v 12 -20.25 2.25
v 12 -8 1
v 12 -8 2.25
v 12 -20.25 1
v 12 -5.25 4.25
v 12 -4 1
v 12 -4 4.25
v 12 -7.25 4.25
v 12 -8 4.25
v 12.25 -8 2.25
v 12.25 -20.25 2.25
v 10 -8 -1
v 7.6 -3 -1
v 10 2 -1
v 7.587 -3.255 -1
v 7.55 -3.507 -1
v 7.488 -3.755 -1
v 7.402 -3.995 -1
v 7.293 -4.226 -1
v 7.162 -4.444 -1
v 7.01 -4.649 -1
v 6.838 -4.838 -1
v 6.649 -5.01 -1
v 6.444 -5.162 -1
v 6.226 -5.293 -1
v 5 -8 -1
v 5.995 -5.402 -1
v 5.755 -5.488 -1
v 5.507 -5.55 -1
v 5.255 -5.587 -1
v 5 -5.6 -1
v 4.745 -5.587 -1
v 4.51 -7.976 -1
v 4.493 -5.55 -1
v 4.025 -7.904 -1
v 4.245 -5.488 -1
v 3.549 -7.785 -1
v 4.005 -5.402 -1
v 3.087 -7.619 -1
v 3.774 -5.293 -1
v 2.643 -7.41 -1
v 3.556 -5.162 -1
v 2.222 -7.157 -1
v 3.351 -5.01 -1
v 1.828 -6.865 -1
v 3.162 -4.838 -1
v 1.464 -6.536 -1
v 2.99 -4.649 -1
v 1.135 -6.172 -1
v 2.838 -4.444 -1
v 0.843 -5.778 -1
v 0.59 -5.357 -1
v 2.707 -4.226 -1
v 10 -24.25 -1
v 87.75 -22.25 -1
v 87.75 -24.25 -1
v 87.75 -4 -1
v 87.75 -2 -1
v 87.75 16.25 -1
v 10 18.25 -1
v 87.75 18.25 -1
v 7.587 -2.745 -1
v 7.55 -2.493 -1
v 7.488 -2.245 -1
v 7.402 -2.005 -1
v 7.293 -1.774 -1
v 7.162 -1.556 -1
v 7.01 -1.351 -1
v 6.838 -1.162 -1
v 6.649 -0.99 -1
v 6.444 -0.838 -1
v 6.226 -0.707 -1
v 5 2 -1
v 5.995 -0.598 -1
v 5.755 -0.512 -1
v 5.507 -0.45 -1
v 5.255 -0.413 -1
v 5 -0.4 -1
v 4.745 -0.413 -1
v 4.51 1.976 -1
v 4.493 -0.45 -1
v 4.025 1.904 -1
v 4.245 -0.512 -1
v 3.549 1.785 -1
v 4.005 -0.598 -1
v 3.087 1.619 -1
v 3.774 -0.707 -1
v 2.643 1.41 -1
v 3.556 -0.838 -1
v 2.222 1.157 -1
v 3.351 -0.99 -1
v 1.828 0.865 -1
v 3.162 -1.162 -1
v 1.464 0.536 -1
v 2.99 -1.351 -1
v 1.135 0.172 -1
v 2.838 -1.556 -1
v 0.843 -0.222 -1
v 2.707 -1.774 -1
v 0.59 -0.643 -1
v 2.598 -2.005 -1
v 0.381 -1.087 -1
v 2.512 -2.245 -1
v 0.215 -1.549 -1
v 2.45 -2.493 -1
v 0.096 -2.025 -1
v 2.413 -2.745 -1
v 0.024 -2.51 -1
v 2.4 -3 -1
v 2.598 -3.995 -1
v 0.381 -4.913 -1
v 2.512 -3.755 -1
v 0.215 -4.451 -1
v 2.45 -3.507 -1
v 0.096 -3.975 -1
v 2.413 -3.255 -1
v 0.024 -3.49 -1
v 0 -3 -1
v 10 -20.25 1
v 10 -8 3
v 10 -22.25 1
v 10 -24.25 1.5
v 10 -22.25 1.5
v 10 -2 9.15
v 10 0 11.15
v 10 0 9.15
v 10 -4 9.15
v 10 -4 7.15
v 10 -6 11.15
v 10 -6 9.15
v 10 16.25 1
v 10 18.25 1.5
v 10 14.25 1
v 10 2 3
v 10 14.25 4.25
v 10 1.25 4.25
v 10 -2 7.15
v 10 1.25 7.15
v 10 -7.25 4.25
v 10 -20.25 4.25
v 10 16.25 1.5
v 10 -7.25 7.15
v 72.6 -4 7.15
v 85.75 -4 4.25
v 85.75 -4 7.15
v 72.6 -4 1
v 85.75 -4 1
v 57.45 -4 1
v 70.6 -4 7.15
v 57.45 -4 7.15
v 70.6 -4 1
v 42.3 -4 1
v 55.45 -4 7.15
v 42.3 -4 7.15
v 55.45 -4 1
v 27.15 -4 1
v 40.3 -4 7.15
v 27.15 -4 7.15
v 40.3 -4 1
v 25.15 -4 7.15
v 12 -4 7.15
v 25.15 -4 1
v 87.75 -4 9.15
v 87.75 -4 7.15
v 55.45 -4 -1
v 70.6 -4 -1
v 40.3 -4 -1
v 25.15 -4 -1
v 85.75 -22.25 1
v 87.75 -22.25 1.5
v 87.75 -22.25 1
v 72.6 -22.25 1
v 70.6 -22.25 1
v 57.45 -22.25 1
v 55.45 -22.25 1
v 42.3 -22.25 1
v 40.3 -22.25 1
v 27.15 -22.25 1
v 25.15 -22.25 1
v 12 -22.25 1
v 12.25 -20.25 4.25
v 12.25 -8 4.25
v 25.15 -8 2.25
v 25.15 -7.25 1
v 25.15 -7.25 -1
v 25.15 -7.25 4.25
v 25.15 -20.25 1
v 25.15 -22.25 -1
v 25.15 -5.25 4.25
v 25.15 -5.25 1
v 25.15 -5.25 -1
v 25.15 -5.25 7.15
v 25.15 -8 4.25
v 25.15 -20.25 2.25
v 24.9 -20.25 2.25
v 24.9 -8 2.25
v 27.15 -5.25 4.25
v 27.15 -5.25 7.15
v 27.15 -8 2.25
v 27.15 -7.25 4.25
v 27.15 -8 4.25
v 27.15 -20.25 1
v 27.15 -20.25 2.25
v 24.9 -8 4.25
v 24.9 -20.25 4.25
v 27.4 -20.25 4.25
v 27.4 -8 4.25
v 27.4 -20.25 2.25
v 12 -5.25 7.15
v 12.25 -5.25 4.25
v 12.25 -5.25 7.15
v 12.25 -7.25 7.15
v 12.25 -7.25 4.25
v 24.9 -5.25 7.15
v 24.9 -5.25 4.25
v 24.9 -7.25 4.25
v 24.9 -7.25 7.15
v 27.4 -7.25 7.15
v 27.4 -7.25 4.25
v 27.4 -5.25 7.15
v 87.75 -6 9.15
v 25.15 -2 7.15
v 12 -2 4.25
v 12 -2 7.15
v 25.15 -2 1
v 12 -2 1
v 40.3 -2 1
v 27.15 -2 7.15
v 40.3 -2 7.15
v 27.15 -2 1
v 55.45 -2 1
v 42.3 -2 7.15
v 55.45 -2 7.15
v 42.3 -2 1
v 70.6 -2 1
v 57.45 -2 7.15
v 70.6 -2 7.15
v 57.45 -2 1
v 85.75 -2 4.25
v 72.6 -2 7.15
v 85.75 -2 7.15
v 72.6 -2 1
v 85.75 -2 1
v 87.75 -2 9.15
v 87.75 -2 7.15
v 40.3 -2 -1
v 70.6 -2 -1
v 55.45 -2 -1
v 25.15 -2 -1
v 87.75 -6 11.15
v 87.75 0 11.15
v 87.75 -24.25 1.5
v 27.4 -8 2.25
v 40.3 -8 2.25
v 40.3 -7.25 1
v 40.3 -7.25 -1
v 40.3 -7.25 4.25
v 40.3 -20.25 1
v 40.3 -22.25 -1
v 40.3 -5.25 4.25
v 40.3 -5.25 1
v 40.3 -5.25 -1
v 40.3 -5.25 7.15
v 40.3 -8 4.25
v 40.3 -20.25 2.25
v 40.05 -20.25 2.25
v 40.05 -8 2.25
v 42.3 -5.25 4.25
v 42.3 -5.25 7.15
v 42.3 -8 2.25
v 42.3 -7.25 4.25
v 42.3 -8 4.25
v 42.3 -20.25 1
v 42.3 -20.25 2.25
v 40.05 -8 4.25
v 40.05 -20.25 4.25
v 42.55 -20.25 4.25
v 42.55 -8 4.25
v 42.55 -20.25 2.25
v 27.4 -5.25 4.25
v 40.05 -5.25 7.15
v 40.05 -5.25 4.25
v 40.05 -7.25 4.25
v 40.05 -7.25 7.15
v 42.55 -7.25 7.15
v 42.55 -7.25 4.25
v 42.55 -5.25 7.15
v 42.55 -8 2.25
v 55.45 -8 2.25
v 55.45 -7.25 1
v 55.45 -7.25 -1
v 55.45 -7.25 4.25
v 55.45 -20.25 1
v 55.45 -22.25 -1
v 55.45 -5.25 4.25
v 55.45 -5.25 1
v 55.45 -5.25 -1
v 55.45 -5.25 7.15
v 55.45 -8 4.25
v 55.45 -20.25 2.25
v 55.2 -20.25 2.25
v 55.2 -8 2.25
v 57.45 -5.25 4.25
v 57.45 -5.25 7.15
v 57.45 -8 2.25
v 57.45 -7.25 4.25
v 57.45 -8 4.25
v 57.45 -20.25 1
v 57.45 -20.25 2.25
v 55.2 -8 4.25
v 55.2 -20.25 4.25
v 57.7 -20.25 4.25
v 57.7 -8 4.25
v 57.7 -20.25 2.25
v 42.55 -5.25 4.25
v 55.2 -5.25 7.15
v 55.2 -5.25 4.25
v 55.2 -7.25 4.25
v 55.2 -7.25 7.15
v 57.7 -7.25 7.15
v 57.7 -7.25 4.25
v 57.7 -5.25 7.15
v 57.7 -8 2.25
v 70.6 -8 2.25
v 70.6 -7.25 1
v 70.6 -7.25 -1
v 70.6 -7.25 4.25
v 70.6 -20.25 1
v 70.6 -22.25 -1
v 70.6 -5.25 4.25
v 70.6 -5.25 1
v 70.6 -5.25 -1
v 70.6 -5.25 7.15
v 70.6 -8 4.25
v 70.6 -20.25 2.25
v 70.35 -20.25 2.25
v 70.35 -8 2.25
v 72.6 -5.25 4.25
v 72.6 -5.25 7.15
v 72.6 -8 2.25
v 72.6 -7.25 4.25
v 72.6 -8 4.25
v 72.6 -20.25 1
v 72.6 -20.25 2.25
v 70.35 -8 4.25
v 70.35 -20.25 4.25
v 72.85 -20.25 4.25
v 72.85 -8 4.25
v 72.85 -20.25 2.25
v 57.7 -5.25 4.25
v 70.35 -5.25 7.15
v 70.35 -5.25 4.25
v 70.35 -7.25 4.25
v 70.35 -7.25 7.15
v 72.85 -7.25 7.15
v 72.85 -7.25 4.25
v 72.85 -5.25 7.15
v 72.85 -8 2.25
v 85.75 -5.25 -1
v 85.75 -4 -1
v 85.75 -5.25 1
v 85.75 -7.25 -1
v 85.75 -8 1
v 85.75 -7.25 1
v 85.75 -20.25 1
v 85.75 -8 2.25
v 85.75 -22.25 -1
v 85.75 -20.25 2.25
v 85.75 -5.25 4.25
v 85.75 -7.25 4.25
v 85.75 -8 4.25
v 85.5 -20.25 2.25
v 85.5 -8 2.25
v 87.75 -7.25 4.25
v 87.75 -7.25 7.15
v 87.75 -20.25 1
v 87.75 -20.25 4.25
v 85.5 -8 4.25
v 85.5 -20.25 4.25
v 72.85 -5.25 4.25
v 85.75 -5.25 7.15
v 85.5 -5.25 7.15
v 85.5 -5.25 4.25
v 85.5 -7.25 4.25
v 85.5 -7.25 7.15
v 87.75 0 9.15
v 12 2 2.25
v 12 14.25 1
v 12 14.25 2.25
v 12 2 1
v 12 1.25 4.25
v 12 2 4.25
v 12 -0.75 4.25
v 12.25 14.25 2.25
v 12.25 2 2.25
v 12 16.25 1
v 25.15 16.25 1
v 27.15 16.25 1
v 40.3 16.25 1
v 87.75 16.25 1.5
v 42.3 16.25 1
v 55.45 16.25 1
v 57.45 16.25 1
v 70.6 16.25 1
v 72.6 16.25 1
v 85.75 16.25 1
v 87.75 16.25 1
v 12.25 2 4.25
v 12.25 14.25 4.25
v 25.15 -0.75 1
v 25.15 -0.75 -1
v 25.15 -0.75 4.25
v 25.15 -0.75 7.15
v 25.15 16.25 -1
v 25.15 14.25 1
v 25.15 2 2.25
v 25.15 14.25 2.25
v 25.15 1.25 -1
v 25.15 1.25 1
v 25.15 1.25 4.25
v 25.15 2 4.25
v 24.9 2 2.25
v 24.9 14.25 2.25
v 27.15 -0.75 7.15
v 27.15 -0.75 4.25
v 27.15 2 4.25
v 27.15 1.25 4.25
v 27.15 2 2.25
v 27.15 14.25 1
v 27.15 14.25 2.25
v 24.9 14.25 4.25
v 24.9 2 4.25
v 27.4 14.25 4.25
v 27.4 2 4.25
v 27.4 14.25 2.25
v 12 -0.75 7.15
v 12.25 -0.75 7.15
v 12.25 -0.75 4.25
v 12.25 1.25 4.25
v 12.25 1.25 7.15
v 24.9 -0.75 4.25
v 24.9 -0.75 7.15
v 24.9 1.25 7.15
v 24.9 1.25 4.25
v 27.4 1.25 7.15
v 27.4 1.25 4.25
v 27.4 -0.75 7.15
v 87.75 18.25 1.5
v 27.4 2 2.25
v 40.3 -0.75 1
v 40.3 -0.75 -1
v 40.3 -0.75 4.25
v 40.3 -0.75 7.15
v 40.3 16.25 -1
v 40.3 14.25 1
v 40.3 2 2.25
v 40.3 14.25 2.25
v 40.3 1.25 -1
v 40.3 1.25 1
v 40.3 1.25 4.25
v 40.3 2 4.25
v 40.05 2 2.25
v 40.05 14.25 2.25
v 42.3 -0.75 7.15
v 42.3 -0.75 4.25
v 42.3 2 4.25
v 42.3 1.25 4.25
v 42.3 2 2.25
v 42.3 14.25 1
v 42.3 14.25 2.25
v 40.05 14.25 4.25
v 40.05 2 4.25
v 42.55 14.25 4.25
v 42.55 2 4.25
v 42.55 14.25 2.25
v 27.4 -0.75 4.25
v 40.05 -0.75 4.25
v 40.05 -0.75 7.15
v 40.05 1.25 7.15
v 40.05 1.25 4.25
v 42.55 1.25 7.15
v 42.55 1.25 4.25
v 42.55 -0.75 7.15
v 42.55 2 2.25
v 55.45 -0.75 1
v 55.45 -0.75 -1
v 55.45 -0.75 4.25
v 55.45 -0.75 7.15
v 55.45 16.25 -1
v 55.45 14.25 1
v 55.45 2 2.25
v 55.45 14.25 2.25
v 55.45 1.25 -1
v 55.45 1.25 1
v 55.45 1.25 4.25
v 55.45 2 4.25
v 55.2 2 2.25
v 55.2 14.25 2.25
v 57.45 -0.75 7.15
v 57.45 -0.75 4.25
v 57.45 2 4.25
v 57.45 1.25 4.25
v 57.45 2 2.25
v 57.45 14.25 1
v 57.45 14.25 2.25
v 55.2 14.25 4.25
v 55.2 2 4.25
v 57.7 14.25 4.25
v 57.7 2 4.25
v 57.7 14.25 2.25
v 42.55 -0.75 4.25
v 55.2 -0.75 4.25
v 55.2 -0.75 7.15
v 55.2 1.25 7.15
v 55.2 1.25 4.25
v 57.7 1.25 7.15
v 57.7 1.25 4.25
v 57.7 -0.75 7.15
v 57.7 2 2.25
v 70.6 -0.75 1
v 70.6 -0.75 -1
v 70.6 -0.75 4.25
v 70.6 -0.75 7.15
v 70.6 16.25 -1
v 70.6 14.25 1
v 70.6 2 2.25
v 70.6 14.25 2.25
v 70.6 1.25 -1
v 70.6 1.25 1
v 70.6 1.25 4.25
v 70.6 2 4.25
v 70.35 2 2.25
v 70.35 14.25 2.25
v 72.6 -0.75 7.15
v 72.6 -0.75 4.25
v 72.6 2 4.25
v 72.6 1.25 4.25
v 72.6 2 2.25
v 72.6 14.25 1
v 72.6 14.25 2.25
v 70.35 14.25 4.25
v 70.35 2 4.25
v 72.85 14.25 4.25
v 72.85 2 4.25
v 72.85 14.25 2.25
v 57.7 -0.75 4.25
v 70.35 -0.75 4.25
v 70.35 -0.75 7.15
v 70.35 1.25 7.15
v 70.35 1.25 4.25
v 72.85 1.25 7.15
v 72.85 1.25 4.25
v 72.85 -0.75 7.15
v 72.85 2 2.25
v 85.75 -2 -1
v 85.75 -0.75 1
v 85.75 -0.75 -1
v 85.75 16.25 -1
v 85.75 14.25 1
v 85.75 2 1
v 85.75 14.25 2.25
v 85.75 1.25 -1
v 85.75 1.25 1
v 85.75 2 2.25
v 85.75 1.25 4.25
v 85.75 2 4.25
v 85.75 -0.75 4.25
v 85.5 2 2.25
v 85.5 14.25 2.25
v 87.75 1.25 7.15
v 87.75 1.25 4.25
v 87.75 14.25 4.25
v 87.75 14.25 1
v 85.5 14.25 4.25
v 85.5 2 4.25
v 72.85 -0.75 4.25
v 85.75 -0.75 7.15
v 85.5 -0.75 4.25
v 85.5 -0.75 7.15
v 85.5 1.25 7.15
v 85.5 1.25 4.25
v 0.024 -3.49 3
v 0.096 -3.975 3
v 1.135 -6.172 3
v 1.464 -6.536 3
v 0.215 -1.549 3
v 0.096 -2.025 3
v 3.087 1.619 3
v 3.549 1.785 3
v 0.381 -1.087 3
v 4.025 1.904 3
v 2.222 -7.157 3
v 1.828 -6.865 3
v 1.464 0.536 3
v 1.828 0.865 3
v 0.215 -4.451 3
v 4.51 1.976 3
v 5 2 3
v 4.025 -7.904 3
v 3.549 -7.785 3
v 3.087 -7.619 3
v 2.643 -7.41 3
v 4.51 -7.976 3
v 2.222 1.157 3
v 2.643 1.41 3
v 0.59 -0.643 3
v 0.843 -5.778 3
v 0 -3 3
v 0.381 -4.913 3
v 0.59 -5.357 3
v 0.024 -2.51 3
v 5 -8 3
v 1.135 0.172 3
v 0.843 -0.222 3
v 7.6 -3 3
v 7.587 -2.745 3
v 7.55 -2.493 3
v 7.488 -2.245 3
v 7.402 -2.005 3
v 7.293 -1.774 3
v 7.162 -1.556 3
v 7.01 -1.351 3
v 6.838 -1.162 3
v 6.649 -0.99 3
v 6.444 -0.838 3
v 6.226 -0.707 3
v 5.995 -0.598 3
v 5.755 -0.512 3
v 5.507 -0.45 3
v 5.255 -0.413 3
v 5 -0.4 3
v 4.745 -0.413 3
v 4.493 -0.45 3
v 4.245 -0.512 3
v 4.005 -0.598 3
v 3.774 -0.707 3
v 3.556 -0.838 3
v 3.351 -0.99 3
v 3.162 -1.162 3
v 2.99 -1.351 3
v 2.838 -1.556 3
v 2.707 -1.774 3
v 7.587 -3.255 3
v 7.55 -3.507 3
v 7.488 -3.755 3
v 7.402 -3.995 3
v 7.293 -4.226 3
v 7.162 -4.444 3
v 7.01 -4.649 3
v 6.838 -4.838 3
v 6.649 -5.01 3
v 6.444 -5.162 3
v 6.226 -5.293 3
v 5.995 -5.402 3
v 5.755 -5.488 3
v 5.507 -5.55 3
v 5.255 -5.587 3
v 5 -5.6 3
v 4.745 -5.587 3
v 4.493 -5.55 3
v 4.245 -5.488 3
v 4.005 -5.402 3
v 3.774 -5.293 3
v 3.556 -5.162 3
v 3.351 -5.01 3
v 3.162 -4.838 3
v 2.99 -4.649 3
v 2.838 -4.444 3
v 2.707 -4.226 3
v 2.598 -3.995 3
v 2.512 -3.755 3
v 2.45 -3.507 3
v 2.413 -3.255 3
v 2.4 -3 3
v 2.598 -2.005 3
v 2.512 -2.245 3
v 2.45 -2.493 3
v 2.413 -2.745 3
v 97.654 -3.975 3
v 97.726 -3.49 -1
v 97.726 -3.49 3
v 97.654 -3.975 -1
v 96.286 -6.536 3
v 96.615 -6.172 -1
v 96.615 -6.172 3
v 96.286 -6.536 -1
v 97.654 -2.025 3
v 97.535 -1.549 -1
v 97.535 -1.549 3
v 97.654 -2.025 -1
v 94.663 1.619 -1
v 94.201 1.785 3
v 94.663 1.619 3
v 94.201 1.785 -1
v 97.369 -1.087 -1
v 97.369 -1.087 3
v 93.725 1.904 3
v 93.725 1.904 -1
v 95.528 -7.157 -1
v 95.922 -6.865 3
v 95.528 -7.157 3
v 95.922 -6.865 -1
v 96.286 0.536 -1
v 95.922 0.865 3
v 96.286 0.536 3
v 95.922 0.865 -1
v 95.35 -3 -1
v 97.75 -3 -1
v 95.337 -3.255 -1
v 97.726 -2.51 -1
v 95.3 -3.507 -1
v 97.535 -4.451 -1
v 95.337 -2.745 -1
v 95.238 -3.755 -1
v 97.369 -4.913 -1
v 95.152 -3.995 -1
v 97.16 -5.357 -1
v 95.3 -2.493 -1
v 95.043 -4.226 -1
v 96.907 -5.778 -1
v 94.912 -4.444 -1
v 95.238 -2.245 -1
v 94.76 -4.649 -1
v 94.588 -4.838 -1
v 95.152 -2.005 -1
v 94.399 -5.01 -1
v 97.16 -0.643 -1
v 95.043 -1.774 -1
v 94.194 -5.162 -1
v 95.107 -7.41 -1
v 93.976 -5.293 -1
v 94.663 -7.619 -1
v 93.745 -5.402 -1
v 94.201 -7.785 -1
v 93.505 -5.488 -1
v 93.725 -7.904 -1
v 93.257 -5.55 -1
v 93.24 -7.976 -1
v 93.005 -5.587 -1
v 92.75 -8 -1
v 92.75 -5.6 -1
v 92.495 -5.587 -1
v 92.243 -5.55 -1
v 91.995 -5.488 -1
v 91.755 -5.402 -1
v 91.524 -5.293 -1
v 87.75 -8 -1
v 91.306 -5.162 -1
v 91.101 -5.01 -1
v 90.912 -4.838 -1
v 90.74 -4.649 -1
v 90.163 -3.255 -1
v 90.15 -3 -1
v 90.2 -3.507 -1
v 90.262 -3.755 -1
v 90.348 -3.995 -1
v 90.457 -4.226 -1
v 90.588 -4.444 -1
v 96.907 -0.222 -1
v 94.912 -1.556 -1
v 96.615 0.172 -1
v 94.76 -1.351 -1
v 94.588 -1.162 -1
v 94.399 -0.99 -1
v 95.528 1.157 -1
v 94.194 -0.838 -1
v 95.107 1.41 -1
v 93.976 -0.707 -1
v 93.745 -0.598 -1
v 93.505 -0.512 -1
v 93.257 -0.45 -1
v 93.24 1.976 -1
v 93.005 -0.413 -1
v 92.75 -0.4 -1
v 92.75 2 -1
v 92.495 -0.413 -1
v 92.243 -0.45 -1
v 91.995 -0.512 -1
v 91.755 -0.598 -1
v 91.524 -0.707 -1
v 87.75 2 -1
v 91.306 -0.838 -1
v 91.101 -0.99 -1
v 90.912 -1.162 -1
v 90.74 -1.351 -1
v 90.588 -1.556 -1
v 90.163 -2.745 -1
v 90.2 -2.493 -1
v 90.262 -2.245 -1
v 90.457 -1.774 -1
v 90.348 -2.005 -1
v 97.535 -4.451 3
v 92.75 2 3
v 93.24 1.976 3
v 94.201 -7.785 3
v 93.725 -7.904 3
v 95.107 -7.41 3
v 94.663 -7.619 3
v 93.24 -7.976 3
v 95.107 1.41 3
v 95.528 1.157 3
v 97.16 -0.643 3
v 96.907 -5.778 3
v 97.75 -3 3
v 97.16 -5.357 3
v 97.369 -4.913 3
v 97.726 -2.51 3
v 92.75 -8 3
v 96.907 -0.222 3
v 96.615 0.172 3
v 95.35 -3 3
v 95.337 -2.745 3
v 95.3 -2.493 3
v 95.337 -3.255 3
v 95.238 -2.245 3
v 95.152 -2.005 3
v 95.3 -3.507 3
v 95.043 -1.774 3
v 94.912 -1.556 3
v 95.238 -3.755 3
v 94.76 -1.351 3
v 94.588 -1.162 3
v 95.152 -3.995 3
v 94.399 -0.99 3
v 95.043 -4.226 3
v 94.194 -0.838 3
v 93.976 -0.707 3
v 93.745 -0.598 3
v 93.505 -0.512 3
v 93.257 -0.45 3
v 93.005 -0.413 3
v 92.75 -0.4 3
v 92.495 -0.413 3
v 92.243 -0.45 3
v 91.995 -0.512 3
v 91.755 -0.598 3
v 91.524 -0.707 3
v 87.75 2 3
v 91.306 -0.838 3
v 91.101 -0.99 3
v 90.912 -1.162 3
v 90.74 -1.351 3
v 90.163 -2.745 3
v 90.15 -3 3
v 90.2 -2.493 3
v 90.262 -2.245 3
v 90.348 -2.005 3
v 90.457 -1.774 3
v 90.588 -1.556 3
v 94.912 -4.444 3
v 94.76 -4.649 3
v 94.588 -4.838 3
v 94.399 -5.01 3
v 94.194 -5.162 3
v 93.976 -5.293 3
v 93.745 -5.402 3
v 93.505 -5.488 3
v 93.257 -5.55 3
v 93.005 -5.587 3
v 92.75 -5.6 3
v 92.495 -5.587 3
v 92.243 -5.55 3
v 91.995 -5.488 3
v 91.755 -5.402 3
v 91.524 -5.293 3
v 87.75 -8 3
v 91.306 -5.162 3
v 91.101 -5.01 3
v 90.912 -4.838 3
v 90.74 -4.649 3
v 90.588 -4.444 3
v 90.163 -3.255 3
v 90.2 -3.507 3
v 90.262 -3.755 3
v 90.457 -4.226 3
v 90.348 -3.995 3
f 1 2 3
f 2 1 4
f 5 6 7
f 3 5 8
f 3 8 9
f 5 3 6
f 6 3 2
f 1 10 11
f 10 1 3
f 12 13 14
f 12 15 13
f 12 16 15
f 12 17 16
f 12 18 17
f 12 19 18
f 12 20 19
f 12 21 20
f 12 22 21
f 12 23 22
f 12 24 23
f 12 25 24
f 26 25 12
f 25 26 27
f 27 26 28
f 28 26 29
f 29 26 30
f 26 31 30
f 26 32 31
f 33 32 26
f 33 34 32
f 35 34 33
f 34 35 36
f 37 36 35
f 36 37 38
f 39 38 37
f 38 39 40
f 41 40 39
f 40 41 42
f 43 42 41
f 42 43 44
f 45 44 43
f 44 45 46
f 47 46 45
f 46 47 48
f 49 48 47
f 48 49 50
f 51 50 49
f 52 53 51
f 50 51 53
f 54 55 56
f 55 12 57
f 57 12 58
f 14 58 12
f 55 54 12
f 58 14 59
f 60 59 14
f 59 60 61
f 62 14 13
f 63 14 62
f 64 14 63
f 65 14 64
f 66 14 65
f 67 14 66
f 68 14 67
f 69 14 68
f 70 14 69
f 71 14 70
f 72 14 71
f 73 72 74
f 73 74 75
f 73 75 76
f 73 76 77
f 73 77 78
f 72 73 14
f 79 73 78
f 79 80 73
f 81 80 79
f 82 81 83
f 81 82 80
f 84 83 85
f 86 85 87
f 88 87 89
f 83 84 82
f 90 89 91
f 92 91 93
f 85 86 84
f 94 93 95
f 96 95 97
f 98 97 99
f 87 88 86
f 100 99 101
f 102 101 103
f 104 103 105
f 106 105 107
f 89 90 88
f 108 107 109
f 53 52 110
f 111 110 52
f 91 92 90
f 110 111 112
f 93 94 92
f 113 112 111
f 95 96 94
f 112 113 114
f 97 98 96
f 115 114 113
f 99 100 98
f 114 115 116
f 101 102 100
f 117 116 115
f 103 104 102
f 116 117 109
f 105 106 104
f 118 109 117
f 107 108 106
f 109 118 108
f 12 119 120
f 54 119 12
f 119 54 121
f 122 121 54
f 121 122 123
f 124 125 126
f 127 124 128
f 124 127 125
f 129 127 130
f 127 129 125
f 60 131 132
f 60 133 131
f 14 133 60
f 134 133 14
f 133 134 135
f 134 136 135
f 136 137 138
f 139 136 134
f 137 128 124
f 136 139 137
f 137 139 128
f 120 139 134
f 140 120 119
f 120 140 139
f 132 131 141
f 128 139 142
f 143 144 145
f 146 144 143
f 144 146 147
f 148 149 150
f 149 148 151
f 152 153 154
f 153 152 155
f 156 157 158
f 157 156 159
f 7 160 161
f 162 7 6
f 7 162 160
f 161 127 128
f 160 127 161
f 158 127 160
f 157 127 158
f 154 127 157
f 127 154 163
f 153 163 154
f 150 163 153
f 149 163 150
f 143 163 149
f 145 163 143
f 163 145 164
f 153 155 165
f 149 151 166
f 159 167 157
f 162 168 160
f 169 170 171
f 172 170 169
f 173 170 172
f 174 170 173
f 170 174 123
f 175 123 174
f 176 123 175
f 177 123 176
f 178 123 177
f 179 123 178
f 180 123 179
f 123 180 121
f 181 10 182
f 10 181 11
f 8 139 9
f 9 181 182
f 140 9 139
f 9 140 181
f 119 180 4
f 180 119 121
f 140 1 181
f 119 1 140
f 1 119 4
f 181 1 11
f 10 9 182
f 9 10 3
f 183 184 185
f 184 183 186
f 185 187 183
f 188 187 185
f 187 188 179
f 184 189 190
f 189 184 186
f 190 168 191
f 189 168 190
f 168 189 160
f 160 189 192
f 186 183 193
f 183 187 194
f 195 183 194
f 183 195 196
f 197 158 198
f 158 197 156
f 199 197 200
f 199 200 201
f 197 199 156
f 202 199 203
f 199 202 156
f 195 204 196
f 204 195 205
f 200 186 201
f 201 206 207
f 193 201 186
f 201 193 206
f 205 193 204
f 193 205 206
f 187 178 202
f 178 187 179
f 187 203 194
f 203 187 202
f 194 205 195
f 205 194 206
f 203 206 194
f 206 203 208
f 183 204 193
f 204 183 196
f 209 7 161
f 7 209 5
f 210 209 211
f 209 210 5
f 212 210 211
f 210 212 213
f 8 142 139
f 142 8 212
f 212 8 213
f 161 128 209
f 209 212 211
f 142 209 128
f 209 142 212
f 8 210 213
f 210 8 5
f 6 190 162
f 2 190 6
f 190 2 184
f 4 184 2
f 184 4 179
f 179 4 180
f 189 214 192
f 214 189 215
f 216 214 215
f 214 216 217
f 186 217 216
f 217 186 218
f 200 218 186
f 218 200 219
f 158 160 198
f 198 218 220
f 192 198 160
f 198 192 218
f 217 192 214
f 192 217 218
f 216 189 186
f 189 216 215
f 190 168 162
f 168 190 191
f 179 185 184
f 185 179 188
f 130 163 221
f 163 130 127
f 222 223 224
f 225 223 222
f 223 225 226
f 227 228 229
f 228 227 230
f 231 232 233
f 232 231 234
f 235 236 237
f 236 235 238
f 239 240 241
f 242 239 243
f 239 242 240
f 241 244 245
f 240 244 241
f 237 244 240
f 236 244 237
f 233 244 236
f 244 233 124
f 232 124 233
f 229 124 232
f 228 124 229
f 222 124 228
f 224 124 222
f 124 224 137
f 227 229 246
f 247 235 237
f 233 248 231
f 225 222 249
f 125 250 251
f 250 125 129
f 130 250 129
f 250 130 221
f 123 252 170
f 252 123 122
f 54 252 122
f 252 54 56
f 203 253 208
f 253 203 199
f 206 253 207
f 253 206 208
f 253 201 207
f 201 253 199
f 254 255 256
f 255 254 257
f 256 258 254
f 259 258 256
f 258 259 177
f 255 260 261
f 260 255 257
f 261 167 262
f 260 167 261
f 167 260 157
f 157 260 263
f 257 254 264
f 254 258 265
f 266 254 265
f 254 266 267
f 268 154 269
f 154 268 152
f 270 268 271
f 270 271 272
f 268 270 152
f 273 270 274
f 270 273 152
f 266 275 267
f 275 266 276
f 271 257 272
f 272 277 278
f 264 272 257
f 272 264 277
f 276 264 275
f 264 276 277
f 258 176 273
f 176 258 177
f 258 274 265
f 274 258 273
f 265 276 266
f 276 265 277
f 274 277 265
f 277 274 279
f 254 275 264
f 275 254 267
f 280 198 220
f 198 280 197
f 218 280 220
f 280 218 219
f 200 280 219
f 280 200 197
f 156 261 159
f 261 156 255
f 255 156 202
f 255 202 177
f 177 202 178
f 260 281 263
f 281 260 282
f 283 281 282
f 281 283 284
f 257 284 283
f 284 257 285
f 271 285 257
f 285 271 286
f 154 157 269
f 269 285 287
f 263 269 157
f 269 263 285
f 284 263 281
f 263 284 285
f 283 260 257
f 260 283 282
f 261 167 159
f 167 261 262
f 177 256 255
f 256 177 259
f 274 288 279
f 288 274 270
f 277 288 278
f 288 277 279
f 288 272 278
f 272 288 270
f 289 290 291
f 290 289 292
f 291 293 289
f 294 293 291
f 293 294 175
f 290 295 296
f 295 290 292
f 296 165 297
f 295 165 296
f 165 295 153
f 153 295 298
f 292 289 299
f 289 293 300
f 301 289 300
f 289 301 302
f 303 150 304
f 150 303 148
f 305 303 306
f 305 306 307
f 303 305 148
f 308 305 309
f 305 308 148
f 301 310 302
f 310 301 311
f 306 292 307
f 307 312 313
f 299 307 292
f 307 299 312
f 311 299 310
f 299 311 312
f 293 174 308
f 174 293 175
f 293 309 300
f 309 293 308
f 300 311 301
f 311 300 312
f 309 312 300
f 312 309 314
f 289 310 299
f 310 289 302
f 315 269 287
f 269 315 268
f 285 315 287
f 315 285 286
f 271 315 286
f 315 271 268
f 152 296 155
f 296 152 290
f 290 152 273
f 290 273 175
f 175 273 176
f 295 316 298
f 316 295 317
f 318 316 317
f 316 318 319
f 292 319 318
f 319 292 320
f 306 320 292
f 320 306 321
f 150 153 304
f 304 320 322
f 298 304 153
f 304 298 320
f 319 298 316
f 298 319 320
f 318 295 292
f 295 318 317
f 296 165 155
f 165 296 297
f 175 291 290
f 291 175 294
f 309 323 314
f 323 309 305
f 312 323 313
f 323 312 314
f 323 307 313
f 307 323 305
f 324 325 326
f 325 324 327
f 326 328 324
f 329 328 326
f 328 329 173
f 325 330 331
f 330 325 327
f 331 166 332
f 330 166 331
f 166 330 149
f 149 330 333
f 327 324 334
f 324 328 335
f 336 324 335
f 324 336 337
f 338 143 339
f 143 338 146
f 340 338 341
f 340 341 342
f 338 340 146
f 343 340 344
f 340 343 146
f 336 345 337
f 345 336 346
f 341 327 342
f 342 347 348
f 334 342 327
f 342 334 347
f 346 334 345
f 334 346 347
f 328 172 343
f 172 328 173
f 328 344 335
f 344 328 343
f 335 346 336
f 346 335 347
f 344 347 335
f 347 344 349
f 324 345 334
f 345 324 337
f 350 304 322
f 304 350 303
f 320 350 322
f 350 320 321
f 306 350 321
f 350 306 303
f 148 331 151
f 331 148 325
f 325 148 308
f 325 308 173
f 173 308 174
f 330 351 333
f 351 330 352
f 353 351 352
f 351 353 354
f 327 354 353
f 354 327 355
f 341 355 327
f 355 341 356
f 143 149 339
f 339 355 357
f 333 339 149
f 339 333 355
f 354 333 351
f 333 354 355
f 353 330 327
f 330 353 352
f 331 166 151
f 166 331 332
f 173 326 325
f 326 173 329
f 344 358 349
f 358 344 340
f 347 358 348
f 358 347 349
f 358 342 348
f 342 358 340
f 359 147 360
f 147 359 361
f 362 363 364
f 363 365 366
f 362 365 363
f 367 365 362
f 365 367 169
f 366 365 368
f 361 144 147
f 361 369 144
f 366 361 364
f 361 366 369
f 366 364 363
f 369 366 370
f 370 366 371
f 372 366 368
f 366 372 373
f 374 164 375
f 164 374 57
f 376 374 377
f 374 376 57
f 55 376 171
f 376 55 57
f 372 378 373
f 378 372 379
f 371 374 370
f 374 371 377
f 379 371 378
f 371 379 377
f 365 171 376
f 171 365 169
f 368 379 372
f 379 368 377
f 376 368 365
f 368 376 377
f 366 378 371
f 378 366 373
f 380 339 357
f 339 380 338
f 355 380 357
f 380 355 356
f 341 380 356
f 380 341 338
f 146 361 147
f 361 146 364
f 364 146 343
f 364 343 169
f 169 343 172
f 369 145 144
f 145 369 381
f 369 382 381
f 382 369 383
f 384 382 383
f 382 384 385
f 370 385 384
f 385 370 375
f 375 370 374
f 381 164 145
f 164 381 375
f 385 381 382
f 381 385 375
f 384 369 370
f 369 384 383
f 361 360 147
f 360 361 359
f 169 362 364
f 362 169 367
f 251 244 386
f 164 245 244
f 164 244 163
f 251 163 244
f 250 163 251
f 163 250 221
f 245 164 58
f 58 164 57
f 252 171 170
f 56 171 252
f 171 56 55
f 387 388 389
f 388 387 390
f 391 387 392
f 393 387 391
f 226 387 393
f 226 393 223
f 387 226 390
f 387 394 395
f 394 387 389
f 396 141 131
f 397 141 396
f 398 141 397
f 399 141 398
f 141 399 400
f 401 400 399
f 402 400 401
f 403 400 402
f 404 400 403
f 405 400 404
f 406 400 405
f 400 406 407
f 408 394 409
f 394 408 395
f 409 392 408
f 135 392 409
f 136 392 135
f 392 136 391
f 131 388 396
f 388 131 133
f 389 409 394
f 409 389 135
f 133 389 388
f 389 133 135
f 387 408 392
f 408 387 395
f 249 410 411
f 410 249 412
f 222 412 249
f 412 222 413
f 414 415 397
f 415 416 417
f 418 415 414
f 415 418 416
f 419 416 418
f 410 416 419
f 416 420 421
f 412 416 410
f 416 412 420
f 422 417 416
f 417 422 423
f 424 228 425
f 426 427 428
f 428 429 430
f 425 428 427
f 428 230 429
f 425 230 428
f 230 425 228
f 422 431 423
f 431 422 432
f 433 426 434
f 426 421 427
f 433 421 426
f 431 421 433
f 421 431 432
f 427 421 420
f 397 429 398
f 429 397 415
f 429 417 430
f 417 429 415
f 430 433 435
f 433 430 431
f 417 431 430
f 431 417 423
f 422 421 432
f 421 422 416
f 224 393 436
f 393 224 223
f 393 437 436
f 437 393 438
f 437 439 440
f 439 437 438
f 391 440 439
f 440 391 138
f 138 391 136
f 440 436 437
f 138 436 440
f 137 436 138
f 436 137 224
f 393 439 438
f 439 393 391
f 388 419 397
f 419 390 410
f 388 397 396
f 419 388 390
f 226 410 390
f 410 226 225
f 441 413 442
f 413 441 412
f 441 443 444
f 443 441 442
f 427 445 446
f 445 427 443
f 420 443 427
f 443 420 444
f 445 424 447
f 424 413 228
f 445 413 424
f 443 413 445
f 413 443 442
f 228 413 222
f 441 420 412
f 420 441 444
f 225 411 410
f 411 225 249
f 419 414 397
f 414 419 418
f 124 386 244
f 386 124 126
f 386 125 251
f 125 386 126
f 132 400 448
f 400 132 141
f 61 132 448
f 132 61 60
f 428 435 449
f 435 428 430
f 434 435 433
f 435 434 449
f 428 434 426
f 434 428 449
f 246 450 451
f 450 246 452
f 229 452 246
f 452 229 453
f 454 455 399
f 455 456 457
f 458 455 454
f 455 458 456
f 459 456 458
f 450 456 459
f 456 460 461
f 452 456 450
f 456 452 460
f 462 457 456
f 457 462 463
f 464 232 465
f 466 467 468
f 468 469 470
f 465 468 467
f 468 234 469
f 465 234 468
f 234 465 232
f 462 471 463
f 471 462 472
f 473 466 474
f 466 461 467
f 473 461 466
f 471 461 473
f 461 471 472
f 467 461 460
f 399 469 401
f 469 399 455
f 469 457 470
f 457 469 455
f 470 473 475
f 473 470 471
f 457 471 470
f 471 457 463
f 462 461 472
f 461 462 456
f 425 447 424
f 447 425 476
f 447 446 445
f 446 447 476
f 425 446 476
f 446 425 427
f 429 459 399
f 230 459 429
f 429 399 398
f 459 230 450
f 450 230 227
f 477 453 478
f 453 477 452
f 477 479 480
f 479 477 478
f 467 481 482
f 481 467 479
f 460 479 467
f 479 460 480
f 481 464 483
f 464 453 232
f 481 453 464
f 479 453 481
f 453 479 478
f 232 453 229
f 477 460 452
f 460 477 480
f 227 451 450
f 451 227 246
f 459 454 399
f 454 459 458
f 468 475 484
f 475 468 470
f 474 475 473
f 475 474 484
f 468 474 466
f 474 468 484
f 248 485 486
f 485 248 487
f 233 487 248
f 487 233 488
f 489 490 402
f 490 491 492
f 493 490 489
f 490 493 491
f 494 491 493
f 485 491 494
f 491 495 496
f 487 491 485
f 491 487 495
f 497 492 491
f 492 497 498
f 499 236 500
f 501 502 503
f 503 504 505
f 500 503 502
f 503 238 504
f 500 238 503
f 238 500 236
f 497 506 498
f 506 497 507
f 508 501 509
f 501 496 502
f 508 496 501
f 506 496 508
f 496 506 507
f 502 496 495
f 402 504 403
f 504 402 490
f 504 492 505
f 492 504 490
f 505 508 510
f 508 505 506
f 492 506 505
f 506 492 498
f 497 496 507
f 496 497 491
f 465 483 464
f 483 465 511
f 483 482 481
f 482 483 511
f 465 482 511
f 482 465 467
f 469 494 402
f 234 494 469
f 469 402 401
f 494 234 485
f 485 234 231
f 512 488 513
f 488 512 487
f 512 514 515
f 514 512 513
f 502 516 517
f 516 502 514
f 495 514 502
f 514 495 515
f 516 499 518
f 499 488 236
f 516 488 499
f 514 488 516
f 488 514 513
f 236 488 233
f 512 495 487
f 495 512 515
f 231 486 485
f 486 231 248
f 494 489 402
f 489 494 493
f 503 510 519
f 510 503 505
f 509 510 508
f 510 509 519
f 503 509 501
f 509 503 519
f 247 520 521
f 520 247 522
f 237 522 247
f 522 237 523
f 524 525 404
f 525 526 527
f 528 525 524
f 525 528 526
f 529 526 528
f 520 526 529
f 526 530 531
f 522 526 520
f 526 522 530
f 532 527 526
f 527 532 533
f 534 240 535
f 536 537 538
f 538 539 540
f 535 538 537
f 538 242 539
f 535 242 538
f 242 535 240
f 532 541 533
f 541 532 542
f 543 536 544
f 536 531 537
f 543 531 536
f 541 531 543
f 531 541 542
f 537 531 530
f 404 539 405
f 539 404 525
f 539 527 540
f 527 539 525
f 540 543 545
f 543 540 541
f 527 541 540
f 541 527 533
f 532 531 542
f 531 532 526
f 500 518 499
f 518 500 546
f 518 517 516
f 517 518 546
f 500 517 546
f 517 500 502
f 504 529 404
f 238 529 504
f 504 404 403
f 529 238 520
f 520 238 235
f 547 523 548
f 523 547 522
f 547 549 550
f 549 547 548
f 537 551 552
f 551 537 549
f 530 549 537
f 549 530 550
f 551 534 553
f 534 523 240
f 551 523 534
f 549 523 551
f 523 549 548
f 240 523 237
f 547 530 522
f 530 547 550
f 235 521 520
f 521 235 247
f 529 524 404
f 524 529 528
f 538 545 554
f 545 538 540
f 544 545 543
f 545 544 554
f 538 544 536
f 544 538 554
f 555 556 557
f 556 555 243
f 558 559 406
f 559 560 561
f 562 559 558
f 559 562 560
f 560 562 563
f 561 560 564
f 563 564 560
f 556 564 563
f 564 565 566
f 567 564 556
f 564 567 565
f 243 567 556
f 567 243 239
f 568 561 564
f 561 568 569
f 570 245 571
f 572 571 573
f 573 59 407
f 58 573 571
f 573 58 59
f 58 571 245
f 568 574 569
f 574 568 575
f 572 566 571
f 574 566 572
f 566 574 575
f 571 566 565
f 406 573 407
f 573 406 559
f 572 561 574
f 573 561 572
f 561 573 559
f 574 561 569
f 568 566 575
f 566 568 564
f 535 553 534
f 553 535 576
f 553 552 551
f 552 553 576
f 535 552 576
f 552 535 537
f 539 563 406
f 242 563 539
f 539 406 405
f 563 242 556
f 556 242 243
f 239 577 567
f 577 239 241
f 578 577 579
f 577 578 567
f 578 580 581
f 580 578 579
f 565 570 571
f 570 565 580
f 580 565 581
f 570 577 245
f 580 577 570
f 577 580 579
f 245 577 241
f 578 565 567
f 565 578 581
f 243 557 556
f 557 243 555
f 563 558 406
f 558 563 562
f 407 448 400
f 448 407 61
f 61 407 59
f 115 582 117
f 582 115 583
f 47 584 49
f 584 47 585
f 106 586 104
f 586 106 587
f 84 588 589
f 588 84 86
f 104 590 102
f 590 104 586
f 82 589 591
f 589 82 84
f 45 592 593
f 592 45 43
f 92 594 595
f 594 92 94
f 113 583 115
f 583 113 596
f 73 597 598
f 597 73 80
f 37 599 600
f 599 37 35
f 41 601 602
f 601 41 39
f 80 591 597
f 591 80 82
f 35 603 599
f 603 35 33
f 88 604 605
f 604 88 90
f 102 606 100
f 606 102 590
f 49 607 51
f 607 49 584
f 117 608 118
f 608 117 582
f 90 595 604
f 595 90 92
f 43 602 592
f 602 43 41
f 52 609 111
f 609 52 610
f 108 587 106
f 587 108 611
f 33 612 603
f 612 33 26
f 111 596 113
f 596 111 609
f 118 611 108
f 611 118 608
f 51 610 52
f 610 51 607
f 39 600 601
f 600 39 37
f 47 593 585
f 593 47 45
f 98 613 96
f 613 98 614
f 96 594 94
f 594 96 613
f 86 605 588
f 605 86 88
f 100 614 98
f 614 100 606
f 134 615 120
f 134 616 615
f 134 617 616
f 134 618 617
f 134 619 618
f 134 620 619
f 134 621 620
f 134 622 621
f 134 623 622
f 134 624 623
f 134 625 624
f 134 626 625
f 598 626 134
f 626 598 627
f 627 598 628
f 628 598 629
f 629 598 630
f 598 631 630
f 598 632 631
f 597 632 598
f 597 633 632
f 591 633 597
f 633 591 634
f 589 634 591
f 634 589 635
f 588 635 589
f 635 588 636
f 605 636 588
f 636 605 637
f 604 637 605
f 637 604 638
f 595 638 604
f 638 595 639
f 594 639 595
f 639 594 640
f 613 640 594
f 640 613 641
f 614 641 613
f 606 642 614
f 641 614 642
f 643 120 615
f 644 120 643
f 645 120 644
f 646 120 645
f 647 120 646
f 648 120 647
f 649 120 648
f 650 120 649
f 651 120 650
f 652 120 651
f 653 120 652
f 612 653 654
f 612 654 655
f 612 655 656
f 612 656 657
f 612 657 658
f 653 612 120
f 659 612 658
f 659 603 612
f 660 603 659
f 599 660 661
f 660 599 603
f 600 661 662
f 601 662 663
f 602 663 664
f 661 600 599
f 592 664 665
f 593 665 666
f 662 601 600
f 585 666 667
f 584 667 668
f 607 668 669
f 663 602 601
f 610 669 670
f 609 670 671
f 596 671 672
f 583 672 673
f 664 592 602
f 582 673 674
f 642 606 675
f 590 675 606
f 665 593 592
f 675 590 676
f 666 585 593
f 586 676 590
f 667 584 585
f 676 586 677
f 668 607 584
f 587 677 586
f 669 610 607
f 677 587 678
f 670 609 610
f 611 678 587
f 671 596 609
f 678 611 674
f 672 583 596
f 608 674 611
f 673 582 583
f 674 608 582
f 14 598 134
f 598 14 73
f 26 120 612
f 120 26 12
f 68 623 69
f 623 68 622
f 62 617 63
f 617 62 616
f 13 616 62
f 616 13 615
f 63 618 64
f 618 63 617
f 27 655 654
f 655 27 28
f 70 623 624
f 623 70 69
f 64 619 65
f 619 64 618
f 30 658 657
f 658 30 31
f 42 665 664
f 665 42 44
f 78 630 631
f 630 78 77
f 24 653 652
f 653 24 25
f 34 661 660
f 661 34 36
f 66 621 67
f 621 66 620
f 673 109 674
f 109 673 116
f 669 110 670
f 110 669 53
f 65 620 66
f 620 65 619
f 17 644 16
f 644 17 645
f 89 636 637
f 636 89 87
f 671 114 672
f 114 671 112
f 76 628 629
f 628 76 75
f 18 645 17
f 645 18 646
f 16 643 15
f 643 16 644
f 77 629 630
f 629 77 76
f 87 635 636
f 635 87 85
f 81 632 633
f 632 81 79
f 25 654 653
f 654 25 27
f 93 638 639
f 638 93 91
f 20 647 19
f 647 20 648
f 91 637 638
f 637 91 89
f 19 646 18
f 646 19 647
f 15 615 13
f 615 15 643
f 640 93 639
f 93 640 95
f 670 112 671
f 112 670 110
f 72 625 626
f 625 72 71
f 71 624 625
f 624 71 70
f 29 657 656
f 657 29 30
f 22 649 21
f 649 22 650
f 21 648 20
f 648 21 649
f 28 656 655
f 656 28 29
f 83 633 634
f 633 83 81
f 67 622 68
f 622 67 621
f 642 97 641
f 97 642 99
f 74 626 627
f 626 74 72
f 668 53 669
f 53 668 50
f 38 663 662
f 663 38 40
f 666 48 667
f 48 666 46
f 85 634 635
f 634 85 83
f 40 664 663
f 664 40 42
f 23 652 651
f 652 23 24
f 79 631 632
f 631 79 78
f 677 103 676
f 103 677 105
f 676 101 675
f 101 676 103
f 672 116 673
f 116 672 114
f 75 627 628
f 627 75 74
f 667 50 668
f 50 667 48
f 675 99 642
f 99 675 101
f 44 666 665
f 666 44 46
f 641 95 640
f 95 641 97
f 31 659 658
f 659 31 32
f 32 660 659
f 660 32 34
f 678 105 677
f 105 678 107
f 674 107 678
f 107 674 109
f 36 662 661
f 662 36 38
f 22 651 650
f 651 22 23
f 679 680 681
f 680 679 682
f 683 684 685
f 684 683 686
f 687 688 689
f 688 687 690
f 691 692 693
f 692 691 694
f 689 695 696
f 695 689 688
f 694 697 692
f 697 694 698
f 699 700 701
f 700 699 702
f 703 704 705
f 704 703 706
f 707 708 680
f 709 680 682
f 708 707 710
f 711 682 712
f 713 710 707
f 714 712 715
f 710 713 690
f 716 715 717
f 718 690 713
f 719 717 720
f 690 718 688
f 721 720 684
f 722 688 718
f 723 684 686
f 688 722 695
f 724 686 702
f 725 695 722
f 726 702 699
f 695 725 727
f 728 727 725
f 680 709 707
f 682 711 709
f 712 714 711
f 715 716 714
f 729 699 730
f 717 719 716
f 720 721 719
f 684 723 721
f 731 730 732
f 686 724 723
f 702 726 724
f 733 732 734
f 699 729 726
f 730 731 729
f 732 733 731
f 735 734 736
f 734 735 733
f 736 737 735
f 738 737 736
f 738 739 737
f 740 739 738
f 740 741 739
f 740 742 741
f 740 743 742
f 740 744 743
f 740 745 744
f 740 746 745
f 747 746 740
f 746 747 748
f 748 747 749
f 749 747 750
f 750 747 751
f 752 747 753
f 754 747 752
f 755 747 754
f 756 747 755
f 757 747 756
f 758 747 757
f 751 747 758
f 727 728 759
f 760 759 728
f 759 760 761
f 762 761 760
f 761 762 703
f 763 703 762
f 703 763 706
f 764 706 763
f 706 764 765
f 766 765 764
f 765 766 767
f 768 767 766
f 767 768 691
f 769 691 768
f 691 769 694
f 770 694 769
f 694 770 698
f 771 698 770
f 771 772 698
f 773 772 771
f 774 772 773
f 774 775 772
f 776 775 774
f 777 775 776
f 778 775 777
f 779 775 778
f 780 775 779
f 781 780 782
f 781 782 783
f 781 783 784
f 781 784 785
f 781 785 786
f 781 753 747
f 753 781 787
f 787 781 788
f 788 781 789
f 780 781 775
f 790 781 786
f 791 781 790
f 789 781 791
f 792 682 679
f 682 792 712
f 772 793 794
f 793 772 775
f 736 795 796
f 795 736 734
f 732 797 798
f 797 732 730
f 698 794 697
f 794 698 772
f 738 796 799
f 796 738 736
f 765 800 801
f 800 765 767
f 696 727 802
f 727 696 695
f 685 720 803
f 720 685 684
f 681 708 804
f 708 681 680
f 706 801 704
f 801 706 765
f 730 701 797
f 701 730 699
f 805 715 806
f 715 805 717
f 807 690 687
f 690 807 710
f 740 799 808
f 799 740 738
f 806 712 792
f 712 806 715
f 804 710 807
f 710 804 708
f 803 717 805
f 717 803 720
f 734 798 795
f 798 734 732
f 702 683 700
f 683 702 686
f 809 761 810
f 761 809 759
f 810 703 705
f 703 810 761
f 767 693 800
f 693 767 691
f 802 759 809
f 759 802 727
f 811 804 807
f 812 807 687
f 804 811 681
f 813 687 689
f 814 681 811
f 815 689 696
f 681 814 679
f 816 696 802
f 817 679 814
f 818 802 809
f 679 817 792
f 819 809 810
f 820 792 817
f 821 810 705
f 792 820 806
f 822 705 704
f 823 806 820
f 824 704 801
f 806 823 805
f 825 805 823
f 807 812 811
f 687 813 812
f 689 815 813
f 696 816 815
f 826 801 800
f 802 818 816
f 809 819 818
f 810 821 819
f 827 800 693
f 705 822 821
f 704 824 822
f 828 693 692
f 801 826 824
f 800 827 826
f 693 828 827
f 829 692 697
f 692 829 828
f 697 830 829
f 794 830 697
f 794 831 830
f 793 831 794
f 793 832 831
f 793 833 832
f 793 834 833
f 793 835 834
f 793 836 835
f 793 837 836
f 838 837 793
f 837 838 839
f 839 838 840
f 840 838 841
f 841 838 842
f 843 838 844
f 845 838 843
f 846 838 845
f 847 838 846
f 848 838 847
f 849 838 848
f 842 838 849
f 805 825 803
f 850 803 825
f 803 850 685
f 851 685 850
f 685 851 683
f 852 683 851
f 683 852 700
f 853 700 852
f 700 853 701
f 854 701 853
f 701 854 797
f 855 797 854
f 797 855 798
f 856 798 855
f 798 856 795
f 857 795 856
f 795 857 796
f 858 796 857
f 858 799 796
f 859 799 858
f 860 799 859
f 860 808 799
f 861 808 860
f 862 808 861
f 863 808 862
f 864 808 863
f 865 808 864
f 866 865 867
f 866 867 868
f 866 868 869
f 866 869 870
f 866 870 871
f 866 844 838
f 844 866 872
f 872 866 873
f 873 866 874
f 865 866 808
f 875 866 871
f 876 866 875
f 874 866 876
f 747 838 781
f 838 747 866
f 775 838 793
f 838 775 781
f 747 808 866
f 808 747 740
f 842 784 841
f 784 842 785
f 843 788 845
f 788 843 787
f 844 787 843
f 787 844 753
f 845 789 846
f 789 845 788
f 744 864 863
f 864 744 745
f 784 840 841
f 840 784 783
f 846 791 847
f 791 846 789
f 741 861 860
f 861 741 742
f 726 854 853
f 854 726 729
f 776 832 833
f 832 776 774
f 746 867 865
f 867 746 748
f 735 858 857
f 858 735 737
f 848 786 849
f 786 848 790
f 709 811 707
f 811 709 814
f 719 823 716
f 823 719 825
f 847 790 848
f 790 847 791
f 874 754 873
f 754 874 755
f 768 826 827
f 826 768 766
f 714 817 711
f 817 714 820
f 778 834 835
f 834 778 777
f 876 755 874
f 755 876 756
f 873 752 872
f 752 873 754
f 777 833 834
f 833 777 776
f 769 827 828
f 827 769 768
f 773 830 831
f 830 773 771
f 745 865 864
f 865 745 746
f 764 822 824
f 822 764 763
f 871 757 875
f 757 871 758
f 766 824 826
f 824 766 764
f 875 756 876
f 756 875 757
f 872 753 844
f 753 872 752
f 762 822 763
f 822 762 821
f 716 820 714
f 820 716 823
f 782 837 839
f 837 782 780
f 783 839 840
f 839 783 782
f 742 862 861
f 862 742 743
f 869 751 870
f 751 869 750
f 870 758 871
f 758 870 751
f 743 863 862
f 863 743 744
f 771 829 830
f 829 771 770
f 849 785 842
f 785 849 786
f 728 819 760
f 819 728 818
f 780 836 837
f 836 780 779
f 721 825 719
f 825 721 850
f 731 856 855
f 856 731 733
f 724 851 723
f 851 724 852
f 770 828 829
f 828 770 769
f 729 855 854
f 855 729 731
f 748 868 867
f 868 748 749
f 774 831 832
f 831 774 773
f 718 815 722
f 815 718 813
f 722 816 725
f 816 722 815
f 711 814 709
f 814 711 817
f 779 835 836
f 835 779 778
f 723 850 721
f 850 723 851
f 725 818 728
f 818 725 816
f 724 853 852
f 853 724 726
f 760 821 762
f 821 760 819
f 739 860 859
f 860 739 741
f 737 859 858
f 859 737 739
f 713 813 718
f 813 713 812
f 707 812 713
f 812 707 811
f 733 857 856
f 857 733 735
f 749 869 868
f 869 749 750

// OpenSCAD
/* 
WAGO 221 mount

Creates a single row or double row set of 221 blocks
with mounting tabs/ears at either end.

Created - 2017/01/01 by Joo Chung
Further developed - 2025-11-06 by Cameron K. Brooks 
*/

$fn = $preview ? 32 : 64;
z_fight = $preview ? 0.01 : 0;

/* [User Customization] */

// vector of blocks. e.g. [5,3,2], [5,5,5], [2], [3]
blocks_config = [2, 2, 2, 2, 2];

style_config = "horizontal_mirrored"; // ["horizontal_mirrored", "horizontal", "vertical_mirrored", "vertical"]

// Tabs - include or exclude mounting tabs
tabs = true; // [true, false]

// radius of hole in tab
tab_radius = 2.6;

// thickness of tab
tab_height = 4;

// Set width and length of the tab. (tab is basically a square)
tab_width = 10;

function end_customizer() = "WAGO 221 mount";

// Internal Parameters and Functions

// width of a single conductor
conductor_width = 5.6;

// block transparent plastic border
border = 1.75;

// depth of the block
block_depth = 18.25;

// manufacturing allowance
allowance = 0.2;

// Functions
function block_width(x) = conductor_width * x + border + allowance; // block width
function mount_width(i, i_max, blocks) =
  (
    i == 0 ? block_width(blocks[i]) + 2 + mount_width(i + 1, i_max, blocks)
    : (i < i_max ? block_width(blocks[i]) + 2 + mount_width(i + 1, i_max, blocks) : 0)
  ); // mount width (index, max index)

// Modules
module tab(width, hole, thickness) {
  difference() {
    union() {
      cylinder(thickness, width / 2, width / 2, true);
      translate([width / 4, 0, 0]) cube([width / 2, width, thickness], true);
    }
    cylinder(width, hole, hole, true);
  }
}

module shoulder(depth) {
  difference() {
    union() {
      cube([2, block_depth, 3.25], false);
      translate([0, 0, 3.25]) cube([2.25, block_depth, 2], false);
    }
    translate([-z_fight / 2, -z_fight, 2 - z_fight / 2]) cube([2.25 + z_fight, 2 + z_fight, 3.25 + z_fight], false);
    translate([2 + z_fight, block_depth - 4 + z_fight / 2, 2 - z_fight / 2]) cube([0.25, 4, 3.25 + z_fight], false);
  }
}

module backshoulder(height) {
  difference() {
    union() {
      translate([0, 2, 0]) cube([2, 1.25, 10.15]);
      cube([2.25, 2, 10.15]);
    }
    translate([-z_fight / 2, -z_fight / 2, 10.15 - 2]) cube([2.25 + z_fight, 3.25 + z_fight, 2 + z_fight]);
    translate([2 - z_fight, -z_fight / 2, 2 - z_fight / 2]) cube([1.25 + z_fight, 3.25 + z_fight, 3.25 + z_fight]);
  }
}

// WAGO 221 block
module block(nconn) {
  blockwidth = block_width(nconn);

  // base
  translate([2, 2, 0]) cube([blockwidth, block_depth, 2], false);

  // back headboard
  translate([0, block_depth + 2, 0]) cube([blockwidth + 4, 2, 10.15], false);

  // back lip
  translate([0, block_depth, 10.15]) cube([blockwidth + 4, 4, 2], false);

  // front lip
  translate([0, 0, 0]) cube([blockwidth + 4, 2, 2.5], false);

  // left shoulder and right shoulders
  translate([0, 2, 0]) shoulder();
  translate([blockwidth + 4, 2, 0]) mirror([1, 0, 0]) shoulder();

  // back left and shoulder
  translate([0, block_depth - 1.25, 0]) backshoulder();
  translate([blockwidth + 4, block_depth - 1.25, 0]) mirror([1, 0, 0]) backshoulder();
}

module lever_nut_mount(blocks) {

  mountwidth = mount_width(0, len(blocks), blocks);
  if (style_config == "horizontal") {
    // No mirror. Single row of blocks
    // create array of blocks
    for (i = [0:len(blocks) - 1]) {
      offset = (i == 0) ? tab_width : tab_width + mount_width(0, i, blocks);
      translate([offset, 0, 0]) block(blocks[i]);
    }

    // left and right tabs
    if (tabs) {
      translate([tab_width / 2, (block_depth + 4) / 2, tab_height / 2])
        tab(tab_width, tab_radius, tab_height);
      translate([mountwidth + 2 + tab_width + tab_width / 2, (block_depth + 4) / 2, tab_height / 2])
        mirror([1, 0, 0])
          tab(tab_width, tab_radius, tab_height);
    }
  } else if (style_config == "horizontal_mirrored") {
    // Row #1.
    for (i = [0:len(blocks) - 1]) {
      offset = (i == 0) ? tab_width : tab_width + mount_width(0, i, blocks);
      translate([offset, -block_depth - 6, -1])
        block(blocks[i]);
    }

    // Row #2. Flip
    mirror([0, 1, 0])for (i = [0:len(blocks) - 1]) {
      offset = (i == 0) ? tab_width : tab_width + mount_width(0, i, blocks);
      translate([offset, -block_depth, -1]) block(blocks[i]);
    }

    // left and right tabs
    if (tabs) {
      translate([tab_width / 2, -3, (tab_height - 2) / 2])
        tab(tab_width, tab_radius, tab_height);
      translate([mountwidth + 2 + tab_width + tab_width / 2, -3, (tab_height - 2) / 2])
        mirror([1, 0, 0])
          tab(tab_width, tab_radius, tab_height);
    }
  } else if (style_config == "vertical") {
    // Single row of blocks, standing up on headboard
    for (i = [0:len(blocks) - 1]) {
      offset = (i == 0) ? tab_width : tab_width + mount_width(0, i, blocks);
      rotate([-90, 0, 0])
        translate([offset, 0, -1])
          block(blocks[i]);
    }

    // left and right tabs
    if (tabs) {
      translate([tab_width / 2, tab_width/2, -block_depth - tab_height / 2])
        tab(tab_width, tab_radius, tab_height);
      translate([mountwidth + 2 + tab_width + tab_width / 2, tab_width/2, -block_depth - tab_height / 2])
        mirror([1, 0, 0])
          tab(tab_width, tab_radius, tab_height);
    }
  } else if (style_config == "vertical_mirrored") {
    // Mirrored. two rows of blocks, back to back.
    // Row #1. Stand up on headboard.
    rotate([-90, 0, 0])for (i = [0:len(blocks) - 1]) {
      offset = (i == 0) ? tab_width : tab_width + mount_width(0, i, blocks);
      translate([offset, 0, -1])
        block(blocks[i]);
    }

    // Row #2. Opposite rotation. Stand up on headbord
    rotate([90, 0, 0]) mirror([0, 1, 0])for (i = [0:len(blocks) - 1]) {
        offset = (i == 0) ? tab_width : tab_width + mount_width(0, i, blocks);
        translate([offset, 0, -1])
          block(blocks[i]);
      }

    // left and right tabs
    if (tabs) {
      translate([tab_width / 2, 0, -block_depth - tab_height / 2])
        tab(tab_width, tab_radius, tab_height);
      translate([mountwidth + 2 + tab_width + tab_width / 2, 0, -block_depth - tab_height / 2])
        mirror([1, 0, 0])
          tab(tab_width, tab_radius, tab_height);
    }
  } else {
    echo("Error: invalid style_config option.");
  }
}

lever_nut_mount(blocks_config);
